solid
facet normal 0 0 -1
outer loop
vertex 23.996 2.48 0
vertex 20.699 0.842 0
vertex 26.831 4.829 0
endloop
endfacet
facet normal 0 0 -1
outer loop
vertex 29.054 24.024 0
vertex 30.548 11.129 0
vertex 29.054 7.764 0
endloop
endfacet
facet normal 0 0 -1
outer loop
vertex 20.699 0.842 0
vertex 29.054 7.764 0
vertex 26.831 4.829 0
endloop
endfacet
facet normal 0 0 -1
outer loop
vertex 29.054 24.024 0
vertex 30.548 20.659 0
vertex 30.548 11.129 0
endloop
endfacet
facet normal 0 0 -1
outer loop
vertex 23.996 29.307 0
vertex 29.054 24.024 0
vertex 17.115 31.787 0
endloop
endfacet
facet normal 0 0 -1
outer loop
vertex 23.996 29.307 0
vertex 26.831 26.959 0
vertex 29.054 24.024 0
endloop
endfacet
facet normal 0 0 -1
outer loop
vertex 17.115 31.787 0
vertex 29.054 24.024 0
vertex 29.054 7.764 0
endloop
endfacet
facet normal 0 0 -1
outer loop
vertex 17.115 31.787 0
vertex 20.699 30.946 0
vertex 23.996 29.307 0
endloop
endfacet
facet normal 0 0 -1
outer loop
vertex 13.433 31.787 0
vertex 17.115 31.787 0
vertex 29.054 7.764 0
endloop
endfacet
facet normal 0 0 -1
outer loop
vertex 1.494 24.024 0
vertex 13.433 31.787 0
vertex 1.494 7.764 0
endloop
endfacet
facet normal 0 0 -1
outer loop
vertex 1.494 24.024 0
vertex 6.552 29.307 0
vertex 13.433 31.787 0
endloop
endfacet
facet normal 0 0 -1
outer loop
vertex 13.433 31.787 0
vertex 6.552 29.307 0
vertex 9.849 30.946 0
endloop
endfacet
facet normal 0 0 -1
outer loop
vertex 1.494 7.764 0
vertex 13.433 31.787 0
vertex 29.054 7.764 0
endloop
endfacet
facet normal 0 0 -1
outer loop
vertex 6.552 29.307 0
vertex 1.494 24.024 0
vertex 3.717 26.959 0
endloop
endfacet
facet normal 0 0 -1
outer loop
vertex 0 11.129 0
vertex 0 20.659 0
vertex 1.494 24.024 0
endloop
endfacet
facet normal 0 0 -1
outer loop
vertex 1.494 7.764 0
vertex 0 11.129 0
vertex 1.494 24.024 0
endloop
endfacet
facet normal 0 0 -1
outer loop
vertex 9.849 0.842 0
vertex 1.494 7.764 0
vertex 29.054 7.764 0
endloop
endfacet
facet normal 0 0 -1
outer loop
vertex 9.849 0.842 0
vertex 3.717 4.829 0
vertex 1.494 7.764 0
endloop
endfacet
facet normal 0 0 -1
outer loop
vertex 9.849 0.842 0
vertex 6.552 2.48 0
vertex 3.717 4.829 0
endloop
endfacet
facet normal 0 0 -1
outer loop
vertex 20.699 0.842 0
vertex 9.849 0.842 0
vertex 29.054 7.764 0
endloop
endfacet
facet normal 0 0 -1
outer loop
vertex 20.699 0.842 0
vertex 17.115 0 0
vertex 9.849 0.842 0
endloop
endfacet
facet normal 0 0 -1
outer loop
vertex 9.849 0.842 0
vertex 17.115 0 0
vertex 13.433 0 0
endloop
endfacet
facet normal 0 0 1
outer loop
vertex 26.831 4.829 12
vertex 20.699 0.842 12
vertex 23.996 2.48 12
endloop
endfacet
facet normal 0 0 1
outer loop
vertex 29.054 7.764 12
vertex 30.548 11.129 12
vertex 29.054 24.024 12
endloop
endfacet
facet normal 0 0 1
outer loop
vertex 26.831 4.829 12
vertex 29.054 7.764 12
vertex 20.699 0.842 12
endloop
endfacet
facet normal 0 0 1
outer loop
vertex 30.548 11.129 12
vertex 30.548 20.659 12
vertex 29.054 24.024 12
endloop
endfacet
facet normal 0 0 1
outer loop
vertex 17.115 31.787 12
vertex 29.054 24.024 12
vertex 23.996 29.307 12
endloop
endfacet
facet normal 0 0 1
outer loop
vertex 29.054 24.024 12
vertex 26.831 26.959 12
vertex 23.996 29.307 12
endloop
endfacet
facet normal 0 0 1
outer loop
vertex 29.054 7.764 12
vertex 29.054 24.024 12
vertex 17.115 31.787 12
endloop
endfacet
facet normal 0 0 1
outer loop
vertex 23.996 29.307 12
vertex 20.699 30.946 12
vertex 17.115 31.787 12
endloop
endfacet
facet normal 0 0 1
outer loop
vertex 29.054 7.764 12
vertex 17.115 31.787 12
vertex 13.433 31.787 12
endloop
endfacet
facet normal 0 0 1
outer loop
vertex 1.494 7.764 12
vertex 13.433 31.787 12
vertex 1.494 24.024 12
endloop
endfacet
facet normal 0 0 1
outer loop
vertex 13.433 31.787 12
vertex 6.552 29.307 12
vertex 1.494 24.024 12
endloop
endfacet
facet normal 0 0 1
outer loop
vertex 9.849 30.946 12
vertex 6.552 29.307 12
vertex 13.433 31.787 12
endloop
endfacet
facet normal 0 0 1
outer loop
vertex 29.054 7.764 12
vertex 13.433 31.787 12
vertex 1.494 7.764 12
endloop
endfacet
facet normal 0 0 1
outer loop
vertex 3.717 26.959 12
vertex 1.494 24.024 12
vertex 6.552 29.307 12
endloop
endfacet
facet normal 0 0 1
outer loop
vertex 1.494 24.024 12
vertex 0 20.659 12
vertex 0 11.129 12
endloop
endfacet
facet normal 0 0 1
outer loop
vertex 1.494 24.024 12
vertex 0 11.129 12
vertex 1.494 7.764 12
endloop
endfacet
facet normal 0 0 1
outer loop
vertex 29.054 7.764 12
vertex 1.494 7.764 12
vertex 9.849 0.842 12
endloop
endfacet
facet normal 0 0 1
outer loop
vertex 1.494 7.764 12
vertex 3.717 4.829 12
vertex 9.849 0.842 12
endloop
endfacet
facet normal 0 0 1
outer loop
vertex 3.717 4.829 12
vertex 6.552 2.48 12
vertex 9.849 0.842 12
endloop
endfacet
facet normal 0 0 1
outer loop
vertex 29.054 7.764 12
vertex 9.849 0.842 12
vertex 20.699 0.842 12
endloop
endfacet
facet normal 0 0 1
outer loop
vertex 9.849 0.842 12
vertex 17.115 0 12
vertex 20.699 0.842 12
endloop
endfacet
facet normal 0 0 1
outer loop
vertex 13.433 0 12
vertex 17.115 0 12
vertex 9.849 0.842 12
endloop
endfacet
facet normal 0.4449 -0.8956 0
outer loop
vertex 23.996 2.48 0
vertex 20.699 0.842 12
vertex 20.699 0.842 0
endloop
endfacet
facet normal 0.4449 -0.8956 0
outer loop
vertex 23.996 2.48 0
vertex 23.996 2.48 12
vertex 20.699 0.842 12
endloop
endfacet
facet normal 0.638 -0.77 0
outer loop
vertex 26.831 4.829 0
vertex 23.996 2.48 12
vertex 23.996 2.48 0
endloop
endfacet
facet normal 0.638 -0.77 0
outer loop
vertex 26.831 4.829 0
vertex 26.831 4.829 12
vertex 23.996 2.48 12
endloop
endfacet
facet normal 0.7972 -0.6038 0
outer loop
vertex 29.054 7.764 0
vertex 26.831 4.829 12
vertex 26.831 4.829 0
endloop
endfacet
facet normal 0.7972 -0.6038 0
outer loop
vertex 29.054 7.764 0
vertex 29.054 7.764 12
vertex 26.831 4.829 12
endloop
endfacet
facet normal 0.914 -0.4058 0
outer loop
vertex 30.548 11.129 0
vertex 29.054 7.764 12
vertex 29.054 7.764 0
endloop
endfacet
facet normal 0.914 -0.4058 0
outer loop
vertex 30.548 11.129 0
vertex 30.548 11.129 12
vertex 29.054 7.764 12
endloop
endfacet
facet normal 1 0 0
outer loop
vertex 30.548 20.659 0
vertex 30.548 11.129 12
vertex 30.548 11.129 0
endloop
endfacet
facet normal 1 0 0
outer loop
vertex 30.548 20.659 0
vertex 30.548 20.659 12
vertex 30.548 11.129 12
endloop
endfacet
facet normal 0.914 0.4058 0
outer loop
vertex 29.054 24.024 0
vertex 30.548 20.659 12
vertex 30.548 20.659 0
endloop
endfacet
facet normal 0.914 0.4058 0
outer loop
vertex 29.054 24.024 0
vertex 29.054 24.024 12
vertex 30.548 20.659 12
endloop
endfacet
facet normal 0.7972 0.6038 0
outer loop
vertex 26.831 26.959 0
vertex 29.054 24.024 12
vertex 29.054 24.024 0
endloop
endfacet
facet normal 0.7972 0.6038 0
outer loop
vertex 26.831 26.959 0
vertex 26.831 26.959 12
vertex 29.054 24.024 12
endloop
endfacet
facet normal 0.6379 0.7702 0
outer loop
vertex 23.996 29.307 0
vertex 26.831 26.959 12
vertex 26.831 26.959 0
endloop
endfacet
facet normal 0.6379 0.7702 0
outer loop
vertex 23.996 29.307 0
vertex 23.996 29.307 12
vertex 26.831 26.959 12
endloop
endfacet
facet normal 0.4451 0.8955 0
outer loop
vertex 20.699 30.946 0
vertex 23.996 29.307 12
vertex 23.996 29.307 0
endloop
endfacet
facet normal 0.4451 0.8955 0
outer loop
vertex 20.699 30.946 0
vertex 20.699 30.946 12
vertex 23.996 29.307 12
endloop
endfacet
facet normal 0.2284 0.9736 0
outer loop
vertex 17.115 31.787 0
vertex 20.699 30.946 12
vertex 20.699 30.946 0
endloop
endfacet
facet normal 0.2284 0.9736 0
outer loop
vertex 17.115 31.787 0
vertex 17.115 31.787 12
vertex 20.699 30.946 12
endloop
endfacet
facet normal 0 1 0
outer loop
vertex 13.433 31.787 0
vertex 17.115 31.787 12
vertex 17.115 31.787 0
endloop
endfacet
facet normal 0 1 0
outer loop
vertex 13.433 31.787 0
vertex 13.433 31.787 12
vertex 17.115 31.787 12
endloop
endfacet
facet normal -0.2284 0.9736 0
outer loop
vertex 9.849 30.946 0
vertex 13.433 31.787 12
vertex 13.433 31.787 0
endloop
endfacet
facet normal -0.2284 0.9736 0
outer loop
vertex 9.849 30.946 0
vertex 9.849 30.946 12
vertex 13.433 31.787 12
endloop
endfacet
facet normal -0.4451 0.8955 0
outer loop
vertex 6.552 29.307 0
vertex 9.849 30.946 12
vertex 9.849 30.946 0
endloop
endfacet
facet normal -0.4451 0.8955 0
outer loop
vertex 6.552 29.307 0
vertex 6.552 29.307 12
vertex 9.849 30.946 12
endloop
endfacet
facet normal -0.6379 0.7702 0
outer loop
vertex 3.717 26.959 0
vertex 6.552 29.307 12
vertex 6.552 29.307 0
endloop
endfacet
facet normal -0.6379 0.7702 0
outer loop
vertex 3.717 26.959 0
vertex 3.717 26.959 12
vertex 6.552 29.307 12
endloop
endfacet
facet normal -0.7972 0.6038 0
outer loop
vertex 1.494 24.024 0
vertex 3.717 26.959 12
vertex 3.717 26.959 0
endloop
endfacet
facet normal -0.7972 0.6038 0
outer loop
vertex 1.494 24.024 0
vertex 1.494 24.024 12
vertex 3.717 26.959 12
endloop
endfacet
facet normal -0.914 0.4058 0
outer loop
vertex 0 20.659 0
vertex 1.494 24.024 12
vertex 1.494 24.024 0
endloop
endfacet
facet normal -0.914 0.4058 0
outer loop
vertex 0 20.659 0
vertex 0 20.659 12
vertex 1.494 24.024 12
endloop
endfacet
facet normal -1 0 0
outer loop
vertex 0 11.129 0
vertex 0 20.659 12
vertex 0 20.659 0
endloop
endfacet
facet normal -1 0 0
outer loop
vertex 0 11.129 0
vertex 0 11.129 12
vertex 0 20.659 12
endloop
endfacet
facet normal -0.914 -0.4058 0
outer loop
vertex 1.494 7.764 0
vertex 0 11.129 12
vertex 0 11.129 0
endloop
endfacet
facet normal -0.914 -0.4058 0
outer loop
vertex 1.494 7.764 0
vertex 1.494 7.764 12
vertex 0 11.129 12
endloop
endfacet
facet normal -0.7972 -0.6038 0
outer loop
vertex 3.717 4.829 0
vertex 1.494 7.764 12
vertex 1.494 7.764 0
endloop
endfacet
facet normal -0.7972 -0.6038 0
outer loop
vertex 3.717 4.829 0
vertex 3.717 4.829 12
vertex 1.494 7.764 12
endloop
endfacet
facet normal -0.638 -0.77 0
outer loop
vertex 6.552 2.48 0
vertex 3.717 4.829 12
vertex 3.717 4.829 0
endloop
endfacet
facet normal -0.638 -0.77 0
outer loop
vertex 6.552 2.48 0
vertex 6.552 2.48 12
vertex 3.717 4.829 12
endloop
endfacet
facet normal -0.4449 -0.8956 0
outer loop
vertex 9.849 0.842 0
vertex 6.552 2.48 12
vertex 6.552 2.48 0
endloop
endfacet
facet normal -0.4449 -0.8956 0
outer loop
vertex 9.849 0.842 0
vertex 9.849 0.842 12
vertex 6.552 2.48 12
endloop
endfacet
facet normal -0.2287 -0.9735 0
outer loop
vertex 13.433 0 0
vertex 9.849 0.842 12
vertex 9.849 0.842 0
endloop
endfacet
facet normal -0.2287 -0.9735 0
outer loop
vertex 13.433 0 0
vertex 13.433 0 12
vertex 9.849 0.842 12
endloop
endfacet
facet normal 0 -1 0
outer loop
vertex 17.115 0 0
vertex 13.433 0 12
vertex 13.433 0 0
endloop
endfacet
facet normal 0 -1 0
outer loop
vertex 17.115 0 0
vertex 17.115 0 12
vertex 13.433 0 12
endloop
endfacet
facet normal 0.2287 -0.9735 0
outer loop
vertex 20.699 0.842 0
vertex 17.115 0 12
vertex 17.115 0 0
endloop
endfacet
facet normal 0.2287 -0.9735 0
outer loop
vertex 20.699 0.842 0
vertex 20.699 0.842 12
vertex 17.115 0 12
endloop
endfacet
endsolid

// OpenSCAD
$fn = 32;

// ----------------------------------------------------------------------
// Flat adaptor: double_d, 12 mm thick
// ----------------------------------------------------------------------

// --- parameters (mm) ---
profile_height = 12;      // extrusion height
profile_points = 24;      // points of the closed outline

profile = [[30.548, 20.659], [29.054, 24.024], [26.831, 26.959], [23.996, 29.307], [20.699, 30.946], [17.115, 31.787], [13.433, 31.787], [9.849, 30.946], [6.552, 29.307], [3.717, 26.959], [1.494, 24.024], [0, 20.659], [0, 11.129], [1.494, 7.764], [3.717, 4.829], [6.552, 2.48], [9.849, 0.842], [13.433, 0], [17.115, 0], [20.699, 0.842], [23.996, 2.48], [26.831, 4.829], [29.054, 7.764], [30.548, 11.129]];  // single closed polygon, 24 points, counter clockwise

// --- the one profile operation ---
linear_extrude(height = profile_height) polygon(points = profile);
